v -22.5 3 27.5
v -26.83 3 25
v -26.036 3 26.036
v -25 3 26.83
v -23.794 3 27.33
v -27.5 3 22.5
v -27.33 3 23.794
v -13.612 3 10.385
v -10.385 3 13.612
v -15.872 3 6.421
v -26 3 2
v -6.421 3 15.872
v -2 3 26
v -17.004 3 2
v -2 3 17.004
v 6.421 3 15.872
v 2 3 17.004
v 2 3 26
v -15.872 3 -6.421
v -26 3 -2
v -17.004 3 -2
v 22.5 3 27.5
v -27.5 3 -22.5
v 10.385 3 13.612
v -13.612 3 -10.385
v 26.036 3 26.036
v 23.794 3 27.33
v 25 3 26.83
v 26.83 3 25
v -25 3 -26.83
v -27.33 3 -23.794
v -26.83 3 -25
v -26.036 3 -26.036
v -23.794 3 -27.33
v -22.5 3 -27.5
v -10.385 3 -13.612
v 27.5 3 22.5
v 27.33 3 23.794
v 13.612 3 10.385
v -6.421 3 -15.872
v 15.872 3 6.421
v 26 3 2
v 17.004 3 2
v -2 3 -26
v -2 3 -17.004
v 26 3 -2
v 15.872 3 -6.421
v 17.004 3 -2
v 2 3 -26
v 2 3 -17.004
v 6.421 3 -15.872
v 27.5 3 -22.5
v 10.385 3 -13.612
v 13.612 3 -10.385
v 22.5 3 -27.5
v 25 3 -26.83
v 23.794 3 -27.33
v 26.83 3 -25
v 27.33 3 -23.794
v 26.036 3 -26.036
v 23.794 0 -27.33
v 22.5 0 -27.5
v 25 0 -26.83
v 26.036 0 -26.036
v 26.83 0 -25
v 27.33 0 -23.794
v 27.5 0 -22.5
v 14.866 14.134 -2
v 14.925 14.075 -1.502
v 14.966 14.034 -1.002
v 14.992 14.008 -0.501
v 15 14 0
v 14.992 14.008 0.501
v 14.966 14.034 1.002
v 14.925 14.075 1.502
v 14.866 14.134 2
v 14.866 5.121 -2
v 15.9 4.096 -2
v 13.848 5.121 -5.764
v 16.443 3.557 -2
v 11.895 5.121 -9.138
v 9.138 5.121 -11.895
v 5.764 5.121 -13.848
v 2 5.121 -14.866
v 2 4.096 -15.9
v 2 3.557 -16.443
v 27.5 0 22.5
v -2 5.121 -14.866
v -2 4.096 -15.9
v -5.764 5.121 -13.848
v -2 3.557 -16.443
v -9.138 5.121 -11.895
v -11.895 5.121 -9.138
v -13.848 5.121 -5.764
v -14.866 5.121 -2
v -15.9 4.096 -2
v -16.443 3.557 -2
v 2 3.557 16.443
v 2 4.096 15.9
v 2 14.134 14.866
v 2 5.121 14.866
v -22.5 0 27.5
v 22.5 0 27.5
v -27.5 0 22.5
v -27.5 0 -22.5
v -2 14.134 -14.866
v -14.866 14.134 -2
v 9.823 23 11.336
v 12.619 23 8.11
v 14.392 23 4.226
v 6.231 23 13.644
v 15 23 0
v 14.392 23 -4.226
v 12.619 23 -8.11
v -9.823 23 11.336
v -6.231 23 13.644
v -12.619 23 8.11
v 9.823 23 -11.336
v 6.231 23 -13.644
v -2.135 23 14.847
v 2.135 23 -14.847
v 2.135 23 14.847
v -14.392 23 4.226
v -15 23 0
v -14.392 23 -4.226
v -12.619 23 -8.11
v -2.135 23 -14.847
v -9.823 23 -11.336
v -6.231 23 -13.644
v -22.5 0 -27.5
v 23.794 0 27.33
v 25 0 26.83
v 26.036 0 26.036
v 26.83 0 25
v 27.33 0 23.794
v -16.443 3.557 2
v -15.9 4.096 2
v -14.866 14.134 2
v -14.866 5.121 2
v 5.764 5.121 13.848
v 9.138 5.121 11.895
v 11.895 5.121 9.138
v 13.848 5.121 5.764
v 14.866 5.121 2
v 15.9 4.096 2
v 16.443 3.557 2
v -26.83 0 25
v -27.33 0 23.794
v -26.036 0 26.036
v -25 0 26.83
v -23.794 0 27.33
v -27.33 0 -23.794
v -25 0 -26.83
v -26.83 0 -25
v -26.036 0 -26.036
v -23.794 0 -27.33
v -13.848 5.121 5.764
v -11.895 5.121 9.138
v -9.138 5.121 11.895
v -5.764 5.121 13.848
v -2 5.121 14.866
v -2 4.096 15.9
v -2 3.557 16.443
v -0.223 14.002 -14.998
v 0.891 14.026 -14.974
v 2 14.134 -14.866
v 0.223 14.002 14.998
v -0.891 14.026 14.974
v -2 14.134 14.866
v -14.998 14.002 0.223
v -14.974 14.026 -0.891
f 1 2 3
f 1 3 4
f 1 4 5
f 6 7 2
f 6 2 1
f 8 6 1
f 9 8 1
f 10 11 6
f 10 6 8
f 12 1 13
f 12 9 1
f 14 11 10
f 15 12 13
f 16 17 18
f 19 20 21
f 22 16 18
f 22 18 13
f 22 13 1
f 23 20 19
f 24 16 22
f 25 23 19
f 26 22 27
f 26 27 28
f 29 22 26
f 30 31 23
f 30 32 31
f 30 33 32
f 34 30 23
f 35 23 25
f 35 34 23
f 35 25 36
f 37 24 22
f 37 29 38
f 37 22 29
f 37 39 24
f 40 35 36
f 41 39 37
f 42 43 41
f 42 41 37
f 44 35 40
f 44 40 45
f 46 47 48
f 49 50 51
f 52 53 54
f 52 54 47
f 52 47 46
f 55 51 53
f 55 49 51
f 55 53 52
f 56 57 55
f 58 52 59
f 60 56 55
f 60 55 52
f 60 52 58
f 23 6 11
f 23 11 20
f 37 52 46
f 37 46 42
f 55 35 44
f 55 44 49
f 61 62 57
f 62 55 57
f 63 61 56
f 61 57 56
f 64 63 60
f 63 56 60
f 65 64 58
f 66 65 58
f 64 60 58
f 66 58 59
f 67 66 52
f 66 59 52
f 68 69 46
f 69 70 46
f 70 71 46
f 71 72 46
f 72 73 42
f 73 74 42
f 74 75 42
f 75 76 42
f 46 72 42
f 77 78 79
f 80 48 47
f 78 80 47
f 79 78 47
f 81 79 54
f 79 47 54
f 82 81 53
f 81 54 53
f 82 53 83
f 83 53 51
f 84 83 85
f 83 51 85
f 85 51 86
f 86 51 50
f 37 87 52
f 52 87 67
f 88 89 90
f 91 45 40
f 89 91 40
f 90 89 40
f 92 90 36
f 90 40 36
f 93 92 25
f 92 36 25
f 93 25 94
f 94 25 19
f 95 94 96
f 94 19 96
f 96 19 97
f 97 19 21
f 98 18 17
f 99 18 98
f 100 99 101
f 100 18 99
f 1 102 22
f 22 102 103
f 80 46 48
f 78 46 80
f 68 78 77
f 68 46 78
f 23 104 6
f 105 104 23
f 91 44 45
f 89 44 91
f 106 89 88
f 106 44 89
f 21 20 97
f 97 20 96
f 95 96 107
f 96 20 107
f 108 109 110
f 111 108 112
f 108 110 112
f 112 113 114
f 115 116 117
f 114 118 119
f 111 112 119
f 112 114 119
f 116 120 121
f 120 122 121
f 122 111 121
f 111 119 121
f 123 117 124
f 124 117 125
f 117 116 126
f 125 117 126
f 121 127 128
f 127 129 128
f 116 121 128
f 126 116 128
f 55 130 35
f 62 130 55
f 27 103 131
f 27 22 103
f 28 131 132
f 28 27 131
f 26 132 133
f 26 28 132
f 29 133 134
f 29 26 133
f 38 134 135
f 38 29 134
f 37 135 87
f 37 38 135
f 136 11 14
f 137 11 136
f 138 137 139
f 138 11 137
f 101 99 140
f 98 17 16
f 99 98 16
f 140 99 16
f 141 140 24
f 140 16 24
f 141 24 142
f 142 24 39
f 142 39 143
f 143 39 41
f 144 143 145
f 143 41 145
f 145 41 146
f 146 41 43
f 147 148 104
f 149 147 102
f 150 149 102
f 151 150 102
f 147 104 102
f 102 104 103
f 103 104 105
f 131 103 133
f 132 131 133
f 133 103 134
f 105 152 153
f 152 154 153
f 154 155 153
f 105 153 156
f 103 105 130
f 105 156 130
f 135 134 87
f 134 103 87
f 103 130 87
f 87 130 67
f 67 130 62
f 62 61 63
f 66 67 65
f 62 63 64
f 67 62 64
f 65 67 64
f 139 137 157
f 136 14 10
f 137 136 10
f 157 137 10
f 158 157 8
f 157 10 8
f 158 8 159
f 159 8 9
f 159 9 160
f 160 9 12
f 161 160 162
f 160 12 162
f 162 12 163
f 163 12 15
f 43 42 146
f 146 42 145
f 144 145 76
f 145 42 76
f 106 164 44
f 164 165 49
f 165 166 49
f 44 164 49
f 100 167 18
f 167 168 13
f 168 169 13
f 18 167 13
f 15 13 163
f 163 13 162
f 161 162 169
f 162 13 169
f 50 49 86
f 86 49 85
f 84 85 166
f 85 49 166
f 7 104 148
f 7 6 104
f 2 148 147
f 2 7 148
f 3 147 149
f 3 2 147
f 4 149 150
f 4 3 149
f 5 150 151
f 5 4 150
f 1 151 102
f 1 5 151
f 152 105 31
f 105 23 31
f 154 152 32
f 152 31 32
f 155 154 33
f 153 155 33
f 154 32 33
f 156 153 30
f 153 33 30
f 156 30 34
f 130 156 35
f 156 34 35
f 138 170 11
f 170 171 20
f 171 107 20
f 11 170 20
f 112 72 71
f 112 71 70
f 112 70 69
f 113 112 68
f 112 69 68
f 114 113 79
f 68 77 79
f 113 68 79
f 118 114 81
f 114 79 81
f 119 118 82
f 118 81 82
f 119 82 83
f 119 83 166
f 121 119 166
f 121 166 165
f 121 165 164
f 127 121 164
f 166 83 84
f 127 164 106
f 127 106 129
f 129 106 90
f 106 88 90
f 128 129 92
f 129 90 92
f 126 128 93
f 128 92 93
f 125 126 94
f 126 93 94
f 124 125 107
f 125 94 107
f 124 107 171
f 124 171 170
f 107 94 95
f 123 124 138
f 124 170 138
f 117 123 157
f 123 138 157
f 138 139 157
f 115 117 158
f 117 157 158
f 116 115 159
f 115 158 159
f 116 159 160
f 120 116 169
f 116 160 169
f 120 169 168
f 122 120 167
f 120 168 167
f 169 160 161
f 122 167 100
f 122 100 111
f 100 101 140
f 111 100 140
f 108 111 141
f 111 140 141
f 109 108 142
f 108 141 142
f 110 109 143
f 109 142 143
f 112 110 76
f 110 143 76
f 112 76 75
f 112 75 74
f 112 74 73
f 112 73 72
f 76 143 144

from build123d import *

# Parameters (mm, degrees)
SKETCH1_W           = 55
SKETCH1_H           = 55
BOSS_EXTRUDE1_DEPTH = 3
BOSS_EXTRUDE2_DEPTH = 2
CIRPATTERN1_COUNT   = 4
FILLET1_R           = 5


with BuildPart() as part:
    # Sketch1 → Boss-Extrude1 (new body)
    with BuildSketch(Plane(origin=(0, 0, 0), x_dir=(1, 0, 0), z_dir=(0, 1, 0))):
        Rectangle(SKETCH1_W, SKETCH1_H)
    extrude(amount=BOSS_EXTRUDE1_DEPTH)

    # Sketch2 → Revolve1 (revolve)
    with BuildSketch(Plane.XY):
        Polygon((0, 3), (0, 23), (15, 23), (15, 5.121320344), (17.121320344, 3), align=None)
    revolve(axis=Axis((0, 3, 0), (0, 1, 0)))

    # Sketch3 → Boss-Extrude2 (add, symmetric)
    with BuildSketch(Plane(origin=(0, 0, 0), x_dir=(0, 0, -1), z_dir=(1, 0, 0))):
        Polygon((10, 3), (10, 19), (26, 3), align=None)
    boss_extrude2 = extrude(amount=BOSS_EXTRUDE2_DEPTH, both=True)

    # CirPattern1: Boss-Extrude2 ×4 about axis
    cirpattern1_axis = Axis((0, 0, 0), (0, 1, 0))
    for i in range(1, CIRPATTERN1_COUNT):
        add(boss_extrude2.rotate(cirpattern1_axis, i * 360 / CIRPATTERN1_COUNT))

    # Fillet1
    fillet1_edges = [part.edges().sort_by_distance(p)[0] for p in [
        (-27.5, 1.5, -27.5),
        (27.5, 1.5, -27.5),
        (27.5, 1.5, 27.5),
        (-27.5, 1.5, 27.5),
    ]]
    fillet(fillet1_edges, radius=FILLET1_R)


solid = part.part
